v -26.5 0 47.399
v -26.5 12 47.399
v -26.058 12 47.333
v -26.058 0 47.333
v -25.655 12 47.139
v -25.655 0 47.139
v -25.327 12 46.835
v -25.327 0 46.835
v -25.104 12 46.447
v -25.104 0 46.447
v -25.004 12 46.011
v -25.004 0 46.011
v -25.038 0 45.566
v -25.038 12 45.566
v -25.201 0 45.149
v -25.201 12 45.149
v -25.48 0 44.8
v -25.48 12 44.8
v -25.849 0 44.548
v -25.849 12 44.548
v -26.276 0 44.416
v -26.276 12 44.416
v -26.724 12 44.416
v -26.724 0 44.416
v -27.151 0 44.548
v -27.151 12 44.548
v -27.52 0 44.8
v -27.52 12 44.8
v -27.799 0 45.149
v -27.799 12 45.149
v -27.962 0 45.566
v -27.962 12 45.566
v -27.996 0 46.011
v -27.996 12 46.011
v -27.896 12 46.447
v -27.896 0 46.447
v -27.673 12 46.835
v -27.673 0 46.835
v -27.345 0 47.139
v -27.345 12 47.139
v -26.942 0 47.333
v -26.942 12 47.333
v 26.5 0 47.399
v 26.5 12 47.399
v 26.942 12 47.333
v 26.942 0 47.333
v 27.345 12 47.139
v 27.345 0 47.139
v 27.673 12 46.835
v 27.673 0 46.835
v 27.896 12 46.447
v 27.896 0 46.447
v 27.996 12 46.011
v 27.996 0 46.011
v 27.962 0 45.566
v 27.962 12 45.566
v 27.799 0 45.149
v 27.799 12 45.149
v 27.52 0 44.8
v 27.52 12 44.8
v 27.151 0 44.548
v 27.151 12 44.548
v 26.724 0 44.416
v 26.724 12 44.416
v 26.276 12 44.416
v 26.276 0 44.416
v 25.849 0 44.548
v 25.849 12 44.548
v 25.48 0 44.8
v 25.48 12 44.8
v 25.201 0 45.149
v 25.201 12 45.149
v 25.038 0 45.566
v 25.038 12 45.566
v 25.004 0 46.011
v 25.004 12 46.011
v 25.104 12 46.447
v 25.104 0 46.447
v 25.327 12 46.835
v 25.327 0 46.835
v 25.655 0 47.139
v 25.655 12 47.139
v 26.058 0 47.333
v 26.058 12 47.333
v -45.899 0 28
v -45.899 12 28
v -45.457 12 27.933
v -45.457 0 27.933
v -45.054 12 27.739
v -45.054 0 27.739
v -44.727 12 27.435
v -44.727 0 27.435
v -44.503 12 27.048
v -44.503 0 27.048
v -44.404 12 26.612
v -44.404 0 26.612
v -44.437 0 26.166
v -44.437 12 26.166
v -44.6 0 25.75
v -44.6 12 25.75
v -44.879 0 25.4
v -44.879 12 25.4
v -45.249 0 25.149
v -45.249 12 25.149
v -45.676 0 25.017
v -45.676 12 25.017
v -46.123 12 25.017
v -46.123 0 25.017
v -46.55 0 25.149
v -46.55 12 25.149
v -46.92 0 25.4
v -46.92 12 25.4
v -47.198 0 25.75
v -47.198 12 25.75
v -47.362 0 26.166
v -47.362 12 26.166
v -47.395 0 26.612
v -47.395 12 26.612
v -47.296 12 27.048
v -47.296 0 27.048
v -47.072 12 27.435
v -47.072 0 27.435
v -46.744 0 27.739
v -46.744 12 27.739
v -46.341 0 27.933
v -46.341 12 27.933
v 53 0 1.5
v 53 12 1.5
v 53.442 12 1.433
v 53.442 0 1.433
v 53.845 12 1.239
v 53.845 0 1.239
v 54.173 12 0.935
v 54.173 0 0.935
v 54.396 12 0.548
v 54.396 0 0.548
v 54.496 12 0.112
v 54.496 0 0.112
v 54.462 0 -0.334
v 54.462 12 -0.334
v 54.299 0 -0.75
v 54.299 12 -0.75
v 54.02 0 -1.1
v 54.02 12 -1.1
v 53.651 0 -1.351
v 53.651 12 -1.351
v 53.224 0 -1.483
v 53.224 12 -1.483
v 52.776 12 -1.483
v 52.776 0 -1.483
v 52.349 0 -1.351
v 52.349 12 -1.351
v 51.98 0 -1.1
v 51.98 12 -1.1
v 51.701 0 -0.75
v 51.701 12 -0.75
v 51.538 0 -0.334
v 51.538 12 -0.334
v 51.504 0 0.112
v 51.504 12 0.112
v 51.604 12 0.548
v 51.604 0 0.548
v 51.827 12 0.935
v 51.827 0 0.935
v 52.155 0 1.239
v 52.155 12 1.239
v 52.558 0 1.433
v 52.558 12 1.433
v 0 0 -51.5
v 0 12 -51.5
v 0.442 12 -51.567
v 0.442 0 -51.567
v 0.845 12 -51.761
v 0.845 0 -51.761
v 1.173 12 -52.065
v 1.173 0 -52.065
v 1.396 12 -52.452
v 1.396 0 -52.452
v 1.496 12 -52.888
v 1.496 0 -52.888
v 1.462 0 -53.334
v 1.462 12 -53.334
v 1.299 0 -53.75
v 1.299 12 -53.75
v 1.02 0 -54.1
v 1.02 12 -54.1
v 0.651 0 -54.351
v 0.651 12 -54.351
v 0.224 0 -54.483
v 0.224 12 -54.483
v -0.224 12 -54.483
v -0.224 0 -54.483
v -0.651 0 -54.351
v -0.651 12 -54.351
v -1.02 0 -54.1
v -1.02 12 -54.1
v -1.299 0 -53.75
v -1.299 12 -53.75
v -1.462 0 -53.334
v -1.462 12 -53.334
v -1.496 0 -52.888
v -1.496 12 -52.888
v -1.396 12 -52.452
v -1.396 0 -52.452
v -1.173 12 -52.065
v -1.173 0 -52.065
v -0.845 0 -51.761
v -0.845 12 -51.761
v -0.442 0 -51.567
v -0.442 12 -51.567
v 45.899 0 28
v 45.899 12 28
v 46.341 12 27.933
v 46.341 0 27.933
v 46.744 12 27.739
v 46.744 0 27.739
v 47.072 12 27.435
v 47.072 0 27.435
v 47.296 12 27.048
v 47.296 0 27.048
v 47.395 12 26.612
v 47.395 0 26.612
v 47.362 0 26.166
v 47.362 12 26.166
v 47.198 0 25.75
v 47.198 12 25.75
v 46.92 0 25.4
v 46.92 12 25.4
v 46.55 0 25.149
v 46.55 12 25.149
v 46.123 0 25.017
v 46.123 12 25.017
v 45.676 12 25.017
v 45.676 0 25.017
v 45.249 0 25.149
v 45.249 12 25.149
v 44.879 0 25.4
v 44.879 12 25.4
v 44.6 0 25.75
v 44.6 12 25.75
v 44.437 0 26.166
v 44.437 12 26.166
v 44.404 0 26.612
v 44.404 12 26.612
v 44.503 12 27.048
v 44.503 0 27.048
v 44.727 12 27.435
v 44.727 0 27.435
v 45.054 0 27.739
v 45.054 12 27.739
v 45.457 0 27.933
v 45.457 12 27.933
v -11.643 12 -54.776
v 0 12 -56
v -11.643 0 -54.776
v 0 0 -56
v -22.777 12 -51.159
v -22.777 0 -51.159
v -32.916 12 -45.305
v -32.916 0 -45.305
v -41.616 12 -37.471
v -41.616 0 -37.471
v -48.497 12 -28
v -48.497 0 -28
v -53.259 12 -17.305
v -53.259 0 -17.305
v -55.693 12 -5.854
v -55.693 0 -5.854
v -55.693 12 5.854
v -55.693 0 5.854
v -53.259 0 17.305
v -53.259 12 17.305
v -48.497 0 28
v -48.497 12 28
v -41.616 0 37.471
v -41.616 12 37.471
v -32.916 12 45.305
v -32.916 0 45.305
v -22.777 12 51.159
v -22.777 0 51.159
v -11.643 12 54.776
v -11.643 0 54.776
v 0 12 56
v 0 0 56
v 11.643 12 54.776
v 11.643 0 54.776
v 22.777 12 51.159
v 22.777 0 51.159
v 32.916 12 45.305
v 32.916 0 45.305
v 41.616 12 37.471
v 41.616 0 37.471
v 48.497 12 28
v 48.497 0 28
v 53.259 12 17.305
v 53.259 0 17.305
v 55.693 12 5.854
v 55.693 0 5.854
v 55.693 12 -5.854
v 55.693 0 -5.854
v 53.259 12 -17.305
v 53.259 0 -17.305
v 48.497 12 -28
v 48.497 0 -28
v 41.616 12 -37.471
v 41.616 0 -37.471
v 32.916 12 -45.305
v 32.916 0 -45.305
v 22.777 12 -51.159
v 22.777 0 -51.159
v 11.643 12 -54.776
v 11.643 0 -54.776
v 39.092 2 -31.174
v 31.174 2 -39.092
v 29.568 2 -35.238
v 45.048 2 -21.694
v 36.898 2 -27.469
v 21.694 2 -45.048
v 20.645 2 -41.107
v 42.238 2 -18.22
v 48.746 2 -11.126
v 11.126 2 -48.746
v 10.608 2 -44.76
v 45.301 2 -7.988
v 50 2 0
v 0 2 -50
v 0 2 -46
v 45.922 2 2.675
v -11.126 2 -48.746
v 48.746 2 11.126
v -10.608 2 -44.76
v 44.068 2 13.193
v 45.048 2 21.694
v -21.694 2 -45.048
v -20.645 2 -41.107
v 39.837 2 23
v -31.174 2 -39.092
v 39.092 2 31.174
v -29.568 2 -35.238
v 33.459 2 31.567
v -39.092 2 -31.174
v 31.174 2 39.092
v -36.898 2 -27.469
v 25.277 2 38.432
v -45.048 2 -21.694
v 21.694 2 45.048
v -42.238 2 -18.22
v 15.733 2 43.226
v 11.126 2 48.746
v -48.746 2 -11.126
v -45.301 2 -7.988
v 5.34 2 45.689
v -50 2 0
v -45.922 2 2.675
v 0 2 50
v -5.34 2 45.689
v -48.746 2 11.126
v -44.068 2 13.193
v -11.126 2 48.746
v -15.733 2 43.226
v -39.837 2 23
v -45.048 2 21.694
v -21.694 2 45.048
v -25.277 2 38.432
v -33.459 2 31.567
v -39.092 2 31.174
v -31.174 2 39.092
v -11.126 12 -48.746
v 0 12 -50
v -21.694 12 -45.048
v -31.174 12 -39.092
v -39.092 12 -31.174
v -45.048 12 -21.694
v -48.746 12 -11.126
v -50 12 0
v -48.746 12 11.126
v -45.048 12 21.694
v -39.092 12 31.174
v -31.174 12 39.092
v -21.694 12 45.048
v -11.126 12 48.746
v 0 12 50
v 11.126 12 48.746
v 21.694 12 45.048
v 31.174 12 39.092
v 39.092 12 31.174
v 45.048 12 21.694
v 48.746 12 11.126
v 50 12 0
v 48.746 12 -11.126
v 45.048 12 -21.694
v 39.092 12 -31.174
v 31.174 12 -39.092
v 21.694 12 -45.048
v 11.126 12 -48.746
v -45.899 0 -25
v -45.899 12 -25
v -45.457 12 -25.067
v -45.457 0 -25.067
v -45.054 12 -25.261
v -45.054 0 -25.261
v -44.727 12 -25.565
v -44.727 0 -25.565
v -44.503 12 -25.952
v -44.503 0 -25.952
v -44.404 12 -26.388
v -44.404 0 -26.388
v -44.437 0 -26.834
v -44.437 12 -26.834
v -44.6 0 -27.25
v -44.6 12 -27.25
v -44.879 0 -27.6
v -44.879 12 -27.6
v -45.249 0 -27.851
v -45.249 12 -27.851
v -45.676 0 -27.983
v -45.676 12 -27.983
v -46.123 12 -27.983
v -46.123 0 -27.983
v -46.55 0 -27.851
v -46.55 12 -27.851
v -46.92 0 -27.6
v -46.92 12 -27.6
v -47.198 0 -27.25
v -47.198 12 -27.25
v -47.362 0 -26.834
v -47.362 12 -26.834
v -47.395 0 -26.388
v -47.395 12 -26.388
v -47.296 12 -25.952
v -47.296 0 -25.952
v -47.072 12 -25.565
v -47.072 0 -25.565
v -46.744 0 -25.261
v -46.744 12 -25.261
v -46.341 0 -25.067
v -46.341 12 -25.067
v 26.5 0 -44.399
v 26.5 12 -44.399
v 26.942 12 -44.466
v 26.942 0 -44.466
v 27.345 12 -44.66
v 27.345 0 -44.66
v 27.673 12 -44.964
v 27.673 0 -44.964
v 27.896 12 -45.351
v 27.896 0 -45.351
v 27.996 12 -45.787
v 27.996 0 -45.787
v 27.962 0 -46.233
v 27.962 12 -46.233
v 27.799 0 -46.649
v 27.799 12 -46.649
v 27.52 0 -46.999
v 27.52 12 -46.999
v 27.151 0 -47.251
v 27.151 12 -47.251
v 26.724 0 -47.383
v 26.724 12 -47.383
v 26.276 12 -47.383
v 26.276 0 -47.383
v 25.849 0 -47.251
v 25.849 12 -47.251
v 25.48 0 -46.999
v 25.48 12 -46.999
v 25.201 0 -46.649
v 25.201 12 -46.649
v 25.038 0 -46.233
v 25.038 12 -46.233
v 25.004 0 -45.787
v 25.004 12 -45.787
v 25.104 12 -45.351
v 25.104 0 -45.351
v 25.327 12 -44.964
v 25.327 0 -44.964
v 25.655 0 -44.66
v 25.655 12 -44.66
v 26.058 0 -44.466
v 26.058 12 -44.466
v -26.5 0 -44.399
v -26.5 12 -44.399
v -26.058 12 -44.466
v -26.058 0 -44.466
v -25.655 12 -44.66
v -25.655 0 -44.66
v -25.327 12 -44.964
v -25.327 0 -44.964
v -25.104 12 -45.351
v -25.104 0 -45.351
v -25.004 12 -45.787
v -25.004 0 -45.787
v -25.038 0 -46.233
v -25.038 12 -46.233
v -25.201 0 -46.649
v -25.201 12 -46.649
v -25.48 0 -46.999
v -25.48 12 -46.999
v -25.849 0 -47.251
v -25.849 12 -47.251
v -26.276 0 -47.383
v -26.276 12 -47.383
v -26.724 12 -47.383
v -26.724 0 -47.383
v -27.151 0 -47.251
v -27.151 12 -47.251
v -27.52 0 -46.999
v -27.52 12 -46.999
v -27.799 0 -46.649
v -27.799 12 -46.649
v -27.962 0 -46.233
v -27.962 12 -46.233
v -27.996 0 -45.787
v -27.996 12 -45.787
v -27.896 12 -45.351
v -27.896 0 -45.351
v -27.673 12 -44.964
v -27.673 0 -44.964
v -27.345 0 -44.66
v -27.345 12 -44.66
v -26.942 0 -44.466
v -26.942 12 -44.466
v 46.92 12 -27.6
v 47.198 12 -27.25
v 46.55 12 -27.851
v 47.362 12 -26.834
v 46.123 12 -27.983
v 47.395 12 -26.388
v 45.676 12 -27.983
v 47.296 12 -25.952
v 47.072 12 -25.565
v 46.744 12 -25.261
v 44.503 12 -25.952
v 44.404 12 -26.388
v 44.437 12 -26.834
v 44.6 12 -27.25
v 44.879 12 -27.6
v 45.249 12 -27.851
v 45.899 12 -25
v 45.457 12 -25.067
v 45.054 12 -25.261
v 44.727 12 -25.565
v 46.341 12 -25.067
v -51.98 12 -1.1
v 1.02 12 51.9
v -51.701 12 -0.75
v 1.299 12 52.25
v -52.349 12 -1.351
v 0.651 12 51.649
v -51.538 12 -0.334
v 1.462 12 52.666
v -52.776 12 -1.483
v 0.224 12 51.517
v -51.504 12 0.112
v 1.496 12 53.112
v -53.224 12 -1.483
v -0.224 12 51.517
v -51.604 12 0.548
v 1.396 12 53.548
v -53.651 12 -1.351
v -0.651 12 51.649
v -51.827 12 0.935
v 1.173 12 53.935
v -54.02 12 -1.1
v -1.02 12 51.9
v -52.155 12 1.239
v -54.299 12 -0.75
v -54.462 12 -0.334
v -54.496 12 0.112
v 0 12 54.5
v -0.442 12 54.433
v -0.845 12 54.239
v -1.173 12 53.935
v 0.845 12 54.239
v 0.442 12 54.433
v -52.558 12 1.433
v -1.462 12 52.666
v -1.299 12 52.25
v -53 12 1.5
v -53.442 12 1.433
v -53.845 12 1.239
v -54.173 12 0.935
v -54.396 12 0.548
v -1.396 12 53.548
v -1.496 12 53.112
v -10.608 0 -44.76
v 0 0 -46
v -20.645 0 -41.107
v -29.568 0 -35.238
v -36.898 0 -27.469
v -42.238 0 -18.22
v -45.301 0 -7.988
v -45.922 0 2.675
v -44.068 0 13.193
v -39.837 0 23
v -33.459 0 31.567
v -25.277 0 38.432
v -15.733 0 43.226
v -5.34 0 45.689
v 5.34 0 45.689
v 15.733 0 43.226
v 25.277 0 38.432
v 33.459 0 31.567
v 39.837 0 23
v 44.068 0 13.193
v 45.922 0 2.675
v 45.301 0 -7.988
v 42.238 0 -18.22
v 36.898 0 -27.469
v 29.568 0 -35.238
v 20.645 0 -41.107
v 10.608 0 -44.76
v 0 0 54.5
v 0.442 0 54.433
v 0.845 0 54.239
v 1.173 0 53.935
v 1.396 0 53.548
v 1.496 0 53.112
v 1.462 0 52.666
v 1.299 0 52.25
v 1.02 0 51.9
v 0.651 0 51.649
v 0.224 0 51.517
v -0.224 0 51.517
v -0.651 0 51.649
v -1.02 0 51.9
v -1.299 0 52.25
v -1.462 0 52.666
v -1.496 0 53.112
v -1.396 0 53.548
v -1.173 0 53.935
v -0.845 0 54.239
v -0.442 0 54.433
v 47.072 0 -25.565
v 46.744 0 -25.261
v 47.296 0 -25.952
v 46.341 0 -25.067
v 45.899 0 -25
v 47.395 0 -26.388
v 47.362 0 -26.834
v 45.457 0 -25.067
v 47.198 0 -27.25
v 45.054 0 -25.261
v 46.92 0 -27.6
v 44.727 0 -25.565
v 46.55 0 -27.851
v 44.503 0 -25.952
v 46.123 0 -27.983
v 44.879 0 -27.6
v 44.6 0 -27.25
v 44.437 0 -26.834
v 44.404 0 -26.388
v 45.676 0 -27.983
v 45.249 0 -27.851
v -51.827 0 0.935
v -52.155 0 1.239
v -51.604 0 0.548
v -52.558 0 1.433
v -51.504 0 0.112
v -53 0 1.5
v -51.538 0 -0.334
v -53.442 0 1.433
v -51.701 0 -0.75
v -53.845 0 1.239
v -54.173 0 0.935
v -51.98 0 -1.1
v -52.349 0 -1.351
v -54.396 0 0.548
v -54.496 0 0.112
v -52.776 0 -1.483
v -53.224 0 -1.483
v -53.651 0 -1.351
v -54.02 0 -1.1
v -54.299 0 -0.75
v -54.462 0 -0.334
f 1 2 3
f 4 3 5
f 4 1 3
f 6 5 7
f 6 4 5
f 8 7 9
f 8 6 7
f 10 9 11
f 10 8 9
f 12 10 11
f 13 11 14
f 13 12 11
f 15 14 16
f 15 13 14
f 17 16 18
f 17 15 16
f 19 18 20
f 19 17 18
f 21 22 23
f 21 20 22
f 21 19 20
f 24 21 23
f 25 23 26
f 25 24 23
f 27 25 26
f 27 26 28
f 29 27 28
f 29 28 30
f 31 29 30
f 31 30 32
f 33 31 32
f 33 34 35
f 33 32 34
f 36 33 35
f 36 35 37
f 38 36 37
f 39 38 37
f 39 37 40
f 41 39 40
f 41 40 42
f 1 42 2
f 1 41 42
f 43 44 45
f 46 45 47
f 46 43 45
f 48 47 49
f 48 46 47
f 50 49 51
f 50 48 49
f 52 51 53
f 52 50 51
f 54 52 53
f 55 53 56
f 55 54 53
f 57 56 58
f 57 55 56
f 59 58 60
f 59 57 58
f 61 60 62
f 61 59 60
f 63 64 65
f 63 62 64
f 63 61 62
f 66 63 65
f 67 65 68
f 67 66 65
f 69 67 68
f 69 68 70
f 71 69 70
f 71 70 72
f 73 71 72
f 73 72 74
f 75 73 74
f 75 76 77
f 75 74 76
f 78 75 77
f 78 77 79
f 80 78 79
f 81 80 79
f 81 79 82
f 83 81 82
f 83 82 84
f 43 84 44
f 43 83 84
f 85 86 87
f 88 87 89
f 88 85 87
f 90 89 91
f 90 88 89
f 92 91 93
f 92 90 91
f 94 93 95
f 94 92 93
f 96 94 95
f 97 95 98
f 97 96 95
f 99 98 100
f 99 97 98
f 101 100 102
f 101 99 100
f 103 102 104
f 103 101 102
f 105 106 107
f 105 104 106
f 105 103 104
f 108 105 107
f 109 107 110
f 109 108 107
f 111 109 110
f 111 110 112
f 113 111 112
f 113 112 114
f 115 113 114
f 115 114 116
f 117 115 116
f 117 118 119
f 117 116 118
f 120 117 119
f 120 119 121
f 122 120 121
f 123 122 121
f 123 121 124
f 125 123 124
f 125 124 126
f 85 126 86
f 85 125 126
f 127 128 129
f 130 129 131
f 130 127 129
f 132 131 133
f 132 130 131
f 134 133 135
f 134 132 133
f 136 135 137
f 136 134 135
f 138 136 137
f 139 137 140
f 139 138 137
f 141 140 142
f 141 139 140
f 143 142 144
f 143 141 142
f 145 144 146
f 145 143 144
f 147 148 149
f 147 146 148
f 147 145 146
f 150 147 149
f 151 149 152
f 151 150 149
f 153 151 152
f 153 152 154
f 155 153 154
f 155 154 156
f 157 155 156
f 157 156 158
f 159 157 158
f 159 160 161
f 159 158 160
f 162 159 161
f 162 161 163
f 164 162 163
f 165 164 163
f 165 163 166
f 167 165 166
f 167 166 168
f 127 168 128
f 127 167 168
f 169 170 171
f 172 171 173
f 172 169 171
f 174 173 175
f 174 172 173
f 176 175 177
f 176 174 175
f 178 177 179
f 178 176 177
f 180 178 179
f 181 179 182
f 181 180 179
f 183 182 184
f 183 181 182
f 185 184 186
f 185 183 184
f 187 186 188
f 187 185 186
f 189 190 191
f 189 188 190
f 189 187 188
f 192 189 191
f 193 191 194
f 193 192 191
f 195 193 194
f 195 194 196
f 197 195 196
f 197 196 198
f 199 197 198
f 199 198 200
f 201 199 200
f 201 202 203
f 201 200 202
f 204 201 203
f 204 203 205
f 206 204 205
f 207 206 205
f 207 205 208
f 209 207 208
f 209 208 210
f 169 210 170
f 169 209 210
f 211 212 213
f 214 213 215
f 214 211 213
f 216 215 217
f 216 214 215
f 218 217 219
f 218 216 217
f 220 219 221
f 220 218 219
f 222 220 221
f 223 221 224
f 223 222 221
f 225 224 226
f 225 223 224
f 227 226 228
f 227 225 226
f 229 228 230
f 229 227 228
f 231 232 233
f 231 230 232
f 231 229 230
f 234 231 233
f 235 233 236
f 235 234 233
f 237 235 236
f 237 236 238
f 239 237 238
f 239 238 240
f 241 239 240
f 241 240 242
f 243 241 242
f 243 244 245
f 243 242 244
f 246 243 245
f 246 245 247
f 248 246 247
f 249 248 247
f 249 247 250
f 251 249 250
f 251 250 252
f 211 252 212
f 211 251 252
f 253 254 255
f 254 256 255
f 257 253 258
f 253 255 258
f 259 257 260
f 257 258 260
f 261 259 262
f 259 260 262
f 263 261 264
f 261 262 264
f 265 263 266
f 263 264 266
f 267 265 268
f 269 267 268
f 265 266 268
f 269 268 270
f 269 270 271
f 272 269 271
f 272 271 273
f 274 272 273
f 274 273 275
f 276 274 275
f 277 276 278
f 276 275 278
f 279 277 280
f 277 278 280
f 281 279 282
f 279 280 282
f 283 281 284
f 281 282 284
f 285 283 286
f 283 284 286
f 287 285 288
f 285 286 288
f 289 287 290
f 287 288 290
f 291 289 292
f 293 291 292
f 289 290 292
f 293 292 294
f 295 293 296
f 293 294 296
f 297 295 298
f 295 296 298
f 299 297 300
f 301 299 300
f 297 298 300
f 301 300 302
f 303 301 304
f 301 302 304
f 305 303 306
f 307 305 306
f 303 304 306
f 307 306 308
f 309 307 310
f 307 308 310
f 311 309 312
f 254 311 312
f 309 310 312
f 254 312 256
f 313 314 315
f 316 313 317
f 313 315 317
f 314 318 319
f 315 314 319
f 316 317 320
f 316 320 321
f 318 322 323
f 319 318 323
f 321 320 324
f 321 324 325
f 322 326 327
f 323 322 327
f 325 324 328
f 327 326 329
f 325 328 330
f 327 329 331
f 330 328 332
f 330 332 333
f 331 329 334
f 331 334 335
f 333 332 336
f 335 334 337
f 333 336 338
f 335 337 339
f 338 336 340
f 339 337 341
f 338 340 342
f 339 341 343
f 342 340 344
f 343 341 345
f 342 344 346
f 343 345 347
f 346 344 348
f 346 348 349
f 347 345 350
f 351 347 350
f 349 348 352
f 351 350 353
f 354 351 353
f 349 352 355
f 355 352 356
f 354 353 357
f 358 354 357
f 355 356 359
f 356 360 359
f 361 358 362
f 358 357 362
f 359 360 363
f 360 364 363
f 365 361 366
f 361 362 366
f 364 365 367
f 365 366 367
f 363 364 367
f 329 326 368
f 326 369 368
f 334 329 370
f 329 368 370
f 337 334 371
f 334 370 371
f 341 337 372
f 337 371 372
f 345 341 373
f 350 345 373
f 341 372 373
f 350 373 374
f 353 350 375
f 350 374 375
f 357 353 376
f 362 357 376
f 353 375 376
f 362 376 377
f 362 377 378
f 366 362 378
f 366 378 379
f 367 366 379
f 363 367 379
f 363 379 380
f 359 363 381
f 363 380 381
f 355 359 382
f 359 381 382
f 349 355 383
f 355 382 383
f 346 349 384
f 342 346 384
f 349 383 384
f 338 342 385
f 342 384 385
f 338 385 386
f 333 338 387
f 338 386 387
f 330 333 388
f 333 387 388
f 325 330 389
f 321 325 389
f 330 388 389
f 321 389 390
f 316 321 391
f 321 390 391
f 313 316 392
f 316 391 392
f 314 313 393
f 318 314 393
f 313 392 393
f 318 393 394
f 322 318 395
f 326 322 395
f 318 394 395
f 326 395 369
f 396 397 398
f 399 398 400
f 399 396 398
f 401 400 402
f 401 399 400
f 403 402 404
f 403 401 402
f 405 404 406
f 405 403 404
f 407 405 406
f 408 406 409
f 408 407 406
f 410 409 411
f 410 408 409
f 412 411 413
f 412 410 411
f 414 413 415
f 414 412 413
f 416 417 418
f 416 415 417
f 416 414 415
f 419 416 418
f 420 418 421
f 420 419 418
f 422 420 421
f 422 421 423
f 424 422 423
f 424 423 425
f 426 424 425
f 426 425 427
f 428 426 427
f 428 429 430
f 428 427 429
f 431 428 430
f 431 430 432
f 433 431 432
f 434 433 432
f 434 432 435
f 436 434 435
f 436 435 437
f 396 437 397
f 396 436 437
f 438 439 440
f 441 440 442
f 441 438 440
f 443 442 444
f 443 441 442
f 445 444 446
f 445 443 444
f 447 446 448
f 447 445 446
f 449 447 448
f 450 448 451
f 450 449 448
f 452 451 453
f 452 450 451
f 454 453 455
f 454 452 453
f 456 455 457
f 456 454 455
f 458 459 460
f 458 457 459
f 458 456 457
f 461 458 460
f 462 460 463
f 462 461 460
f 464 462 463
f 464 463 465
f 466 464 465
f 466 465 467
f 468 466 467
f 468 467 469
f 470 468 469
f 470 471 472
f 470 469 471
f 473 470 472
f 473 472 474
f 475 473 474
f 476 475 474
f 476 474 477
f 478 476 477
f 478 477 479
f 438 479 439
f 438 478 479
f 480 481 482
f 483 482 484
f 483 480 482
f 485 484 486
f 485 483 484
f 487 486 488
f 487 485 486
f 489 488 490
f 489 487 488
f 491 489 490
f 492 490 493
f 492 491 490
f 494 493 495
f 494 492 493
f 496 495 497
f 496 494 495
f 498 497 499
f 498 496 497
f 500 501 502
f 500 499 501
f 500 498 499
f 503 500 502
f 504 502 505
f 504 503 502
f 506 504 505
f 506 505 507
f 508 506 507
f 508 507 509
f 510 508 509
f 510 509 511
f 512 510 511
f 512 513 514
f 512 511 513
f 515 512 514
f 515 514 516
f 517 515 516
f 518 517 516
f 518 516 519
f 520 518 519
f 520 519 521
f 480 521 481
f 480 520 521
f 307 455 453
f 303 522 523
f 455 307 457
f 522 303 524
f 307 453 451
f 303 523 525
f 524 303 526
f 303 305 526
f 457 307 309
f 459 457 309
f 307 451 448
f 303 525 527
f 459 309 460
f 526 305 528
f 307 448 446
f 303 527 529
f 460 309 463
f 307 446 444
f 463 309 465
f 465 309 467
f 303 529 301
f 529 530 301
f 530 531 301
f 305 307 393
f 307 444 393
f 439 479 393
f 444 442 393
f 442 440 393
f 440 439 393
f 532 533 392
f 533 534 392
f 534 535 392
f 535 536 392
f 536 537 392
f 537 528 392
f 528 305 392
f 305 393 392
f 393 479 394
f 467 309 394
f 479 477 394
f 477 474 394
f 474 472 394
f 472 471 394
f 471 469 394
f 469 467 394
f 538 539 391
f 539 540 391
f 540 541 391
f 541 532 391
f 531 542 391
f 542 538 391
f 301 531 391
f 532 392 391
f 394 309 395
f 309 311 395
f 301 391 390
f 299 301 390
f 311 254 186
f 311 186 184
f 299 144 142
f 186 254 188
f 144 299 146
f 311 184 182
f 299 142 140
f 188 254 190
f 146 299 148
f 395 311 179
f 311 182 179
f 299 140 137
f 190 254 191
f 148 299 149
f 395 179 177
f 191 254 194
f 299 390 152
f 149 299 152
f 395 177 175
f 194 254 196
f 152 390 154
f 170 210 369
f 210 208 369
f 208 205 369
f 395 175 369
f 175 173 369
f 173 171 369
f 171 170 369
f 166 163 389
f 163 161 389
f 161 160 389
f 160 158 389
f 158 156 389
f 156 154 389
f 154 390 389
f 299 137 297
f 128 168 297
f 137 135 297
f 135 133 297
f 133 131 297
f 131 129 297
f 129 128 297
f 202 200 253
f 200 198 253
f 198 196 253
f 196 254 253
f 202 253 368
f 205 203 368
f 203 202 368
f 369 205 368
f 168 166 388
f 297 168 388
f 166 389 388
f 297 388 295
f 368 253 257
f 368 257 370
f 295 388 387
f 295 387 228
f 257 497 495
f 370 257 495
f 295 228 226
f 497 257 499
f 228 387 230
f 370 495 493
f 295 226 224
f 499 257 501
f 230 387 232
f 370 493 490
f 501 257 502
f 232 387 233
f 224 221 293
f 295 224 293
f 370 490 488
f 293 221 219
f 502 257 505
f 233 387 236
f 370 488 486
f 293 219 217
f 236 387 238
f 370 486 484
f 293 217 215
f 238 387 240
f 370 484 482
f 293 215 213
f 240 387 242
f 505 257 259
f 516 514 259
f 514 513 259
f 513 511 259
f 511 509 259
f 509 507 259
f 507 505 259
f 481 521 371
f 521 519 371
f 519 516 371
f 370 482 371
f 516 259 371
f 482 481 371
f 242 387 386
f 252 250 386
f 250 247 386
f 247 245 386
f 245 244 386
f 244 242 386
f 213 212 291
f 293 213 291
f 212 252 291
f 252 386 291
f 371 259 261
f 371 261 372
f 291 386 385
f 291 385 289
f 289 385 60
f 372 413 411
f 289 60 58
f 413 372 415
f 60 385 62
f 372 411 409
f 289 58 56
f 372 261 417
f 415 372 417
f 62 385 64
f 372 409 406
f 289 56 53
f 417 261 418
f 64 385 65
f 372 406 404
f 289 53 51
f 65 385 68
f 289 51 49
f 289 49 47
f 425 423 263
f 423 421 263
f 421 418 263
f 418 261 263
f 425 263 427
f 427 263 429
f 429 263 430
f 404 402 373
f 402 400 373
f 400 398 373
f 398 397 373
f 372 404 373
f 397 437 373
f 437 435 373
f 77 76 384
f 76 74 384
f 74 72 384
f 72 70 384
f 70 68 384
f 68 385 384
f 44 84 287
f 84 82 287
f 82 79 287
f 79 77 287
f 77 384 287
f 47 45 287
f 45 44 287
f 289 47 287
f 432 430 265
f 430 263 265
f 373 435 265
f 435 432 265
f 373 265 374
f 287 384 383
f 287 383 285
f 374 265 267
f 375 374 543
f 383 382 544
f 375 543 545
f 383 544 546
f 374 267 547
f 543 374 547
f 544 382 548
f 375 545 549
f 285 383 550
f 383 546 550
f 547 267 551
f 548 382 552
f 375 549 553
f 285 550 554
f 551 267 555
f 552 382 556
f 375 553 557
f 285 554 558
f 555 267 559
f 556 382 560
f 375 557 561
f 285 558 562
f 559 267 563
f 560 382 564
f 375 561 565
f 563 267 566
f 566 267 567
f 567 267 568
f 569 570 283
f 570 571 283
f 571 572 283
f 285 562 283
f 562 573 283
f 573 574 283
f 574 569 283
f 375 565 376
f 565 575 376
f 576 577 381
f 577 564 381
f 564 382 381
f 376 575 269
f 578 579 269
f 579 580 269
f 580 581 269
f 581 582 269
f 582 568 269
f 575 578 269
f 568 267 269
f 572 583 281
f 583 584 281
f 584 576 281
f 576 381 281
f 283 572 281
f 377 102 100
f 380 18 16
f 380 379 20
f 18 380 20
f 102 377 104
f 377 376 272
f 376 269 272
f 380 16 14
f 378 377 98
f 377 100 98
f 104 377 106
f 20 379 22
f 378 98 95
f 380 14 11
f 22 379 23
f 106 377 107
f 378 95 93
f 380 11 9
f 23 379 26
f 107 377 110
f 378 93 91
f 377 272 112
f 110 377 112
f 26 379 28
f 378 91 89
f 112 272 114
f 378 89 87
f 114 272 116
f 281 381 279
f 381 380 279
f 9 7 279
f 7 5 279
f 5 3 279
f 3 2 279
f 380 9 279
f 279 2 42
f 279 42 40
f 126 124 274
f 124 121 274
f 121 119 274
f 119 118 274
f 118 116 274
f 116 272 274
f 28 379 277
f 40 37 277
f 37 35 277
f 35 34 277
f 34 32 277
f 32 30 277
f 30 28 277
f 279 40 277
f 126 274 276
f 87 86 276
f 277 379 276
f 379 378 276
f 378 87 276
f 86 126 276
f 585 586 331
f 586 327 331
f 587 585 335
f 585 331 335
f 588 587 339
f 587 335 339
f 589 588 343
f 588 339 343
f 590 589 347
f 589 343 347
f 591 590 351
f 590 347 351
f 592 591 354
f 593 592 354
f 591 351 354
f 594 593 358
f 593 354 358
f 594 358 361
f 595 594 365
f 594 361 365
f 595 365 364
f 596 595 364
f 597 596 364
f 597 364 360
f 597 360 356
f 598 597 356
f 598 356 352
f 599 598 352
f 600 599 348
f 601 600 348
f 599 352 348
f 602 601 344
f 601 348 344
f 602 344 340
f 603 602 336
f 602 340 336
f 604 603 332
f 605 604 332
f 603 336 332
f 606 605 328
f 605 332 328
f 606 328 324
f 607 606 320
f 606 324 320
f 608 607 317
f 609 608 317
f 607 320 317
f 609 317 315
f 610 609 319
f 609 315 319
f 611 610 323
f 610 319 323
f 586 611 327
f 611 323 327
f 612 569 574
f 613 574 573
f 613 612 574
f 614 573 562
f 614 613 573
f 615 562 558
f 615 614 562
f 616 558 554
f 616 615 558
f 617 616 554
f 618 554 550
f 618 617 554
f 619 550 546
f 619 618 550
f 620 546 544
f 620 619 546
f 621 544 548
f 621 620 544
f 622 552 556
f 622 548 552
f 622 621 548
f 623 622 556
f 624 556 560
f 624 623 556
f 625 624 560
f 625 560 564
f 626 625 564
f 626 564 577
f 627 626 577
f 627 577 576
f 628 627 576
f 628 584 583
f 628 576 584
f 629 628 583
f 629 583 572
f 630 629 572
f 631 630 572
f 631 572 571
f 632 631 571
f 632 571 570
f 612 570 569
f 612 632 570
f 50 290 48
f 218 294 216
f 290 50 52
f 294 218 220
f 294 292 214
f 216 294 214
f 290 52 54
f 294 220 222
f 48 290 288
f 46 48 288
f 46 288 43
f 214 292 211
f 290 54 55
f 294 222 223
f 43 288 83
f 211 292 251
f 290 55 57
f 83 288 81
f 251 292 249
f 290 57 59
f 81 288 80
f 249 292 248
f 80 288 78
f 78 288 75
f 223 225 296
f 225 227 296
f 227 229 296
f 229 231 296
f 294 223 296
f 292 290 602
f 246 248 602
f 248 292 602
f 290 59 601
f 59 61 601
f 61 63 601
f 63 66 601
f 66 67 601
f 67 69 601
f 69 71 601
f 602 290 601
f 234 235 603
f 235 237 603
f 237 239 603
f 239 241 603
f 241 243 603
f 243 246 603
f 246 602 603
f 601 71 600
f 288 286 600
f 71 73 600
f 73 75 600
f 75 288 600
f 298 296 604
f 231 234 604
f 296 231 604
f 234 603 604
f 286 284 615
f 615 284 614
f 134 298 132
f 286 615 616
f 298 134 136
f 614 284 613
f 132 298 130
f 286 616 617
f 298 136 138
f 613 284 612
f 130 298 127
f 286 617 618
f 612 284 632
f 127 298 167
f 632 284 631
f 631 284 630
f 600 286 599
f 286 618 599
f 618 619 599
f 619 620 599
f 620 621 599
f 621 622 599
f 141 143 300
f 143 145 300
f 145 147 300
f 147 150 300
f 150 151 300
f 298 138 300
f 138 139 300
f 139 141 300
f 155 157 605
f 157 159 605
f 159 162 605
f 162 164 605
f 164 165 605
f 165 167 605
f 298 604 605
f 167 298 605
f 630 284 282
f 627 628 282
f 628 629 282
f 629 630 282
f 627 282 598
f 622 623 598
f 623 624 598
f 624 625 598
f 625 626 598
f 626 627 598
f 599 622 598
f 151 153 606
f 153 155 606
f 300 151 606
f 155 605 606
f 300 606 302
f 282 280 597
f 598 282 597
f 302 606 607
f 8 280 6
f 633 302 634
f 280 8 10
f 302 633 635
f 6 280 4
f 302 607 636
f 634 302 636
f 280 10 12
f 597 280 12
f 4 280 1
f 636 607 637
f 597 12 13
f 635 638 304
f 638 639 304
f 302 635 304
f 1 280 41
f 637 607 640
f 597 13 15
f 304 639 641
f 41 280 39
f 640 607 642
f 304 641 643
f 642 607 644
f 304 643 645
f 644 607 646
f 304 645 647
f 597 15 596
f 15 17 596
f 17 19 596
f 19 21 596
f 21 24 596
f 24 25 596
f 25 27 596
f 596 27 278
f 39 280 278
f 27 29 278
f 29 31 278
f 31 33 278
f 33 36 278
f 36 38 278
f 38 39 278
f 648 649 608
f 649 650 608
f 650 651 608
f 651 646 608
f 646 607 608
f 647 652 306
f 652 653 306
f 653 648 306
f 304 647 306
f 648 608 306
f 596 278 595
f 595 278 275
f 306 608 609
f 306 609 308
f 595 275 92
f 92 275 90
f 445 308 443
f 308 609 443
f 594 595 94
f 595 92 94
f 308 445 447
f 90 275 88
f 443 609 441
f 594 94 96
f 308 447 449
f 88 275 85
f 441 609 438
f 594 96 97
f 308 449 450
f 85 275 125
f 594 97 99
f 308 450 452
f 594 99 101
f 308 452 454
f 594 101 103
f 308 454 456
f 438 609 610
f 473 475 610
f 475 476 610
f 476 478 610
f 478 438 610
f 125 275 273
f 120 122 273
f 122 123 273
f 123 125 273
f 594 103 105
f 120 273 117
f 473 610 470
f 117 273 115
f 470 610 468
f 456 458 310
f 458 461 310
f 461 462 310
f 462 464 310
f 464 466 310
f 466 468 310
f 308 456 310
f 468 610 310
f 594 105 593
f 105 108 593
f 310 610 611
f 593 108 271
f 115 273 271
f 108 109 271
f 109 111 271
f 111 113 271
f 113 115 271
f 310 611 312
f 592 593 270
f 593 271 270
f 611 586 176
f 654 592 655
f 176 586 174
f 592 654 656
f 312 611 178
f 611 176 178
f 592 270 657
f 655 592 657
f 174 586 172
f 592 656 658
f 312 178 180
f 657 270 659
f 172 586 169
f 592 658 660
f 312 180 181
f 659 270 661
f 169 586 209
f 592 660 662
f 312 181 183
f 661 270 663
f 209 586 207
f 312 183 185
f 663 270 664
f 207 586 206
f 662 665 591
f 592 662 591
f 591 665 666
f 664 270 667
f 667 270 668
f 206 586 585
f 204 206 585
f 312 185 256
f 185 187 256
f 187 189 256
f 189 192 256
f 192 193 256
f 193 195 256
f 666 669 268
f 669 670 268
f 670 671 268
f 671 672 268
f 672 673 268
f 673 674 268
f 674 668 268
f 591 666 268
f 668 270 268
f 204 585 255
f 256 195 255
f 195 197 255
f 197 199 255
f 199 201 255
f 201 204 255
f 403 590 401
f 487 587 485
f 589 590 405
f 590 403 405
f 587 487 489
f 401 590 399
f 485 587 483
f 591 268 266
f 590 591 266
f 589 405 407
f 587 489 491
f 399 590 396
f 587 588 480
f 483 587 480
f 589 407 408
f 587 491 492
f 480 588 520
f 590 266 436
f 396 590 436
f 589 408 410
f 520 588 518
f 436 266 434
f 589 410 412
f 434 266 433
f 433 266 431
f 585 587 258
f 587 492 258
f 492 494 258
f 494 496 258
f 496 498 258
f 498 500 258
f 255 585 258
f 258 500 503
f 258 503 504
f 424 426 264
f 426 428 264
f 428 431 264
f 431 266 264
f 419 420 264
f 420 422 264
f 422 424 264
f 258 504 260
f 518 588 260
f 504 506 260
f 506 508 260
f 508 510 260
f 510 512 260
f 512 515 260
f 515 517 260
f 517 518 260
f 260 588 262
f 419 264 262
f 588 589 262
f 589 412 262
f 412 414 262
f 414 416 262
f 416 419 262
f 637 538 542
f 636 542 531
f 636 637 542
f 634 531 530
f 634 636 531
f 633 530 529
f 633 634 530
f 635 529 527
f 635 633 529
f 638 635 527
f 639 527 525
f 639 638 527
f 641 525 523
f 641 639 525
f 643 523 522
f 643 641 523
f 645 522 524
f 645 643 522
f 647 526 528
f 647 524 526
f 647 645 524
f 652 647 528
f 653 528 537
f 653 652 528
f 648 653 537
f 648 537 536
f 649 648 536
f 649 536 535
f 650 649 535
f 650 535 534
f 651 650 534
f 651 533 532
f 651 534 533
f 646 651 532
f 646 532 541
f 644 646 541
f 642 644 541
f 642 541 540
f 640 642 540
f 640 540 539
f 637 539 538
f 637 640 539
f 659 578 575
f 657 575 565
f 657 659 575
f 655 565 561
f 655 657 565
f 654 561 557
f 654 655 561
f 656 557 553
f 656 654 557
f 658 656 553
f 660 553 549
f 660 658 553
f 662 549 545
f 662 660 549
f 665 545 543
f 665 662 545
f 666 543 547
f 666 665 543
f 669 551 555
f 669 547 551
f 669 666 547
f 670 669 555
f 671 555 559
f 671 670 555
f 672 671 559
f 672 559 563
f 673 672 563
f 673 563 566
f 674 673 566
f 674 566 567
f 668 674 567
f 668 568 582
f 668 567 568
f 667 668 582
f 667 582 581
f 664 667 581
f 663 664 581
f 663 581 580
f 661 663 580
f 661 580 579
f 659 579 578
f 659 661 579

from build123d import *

# Parameters (mm, degrees)
SKETCH_3_R          = 1.5
CUT_EXTRUDE_3_DEPTH = 81.099937578


with BuildPart() as part:
    # 草图2 → 旋转1 (revolve)
    with BuildSketch(Plane.XY, mode=Mode.PRIVATE) as revolve_1_sk:
        Polygon((46, 0), (46, 2), (50, 2), (50, 12), (56, 12), (56, 0), align=None)
    revolve(revolve_1_sk.sketch.rotate(Axis((0, 0, 0), (0, 1, 0)), 90), axis=Axis((0, 0, 0), (0, 1, 0)))

    # 草图3 → 切除-拉伸3 (cut, through all)
    with BuildSketch(Plane(origin=(0, 0, 0), x_dir=(1, 0, 0), z_dir=(0, 1, 0))):
        with Locations(Location((0, 53, 0), (0, 0, 270))):
            Circle(SKETCH_3_R)
        with Locations(Location((26.5, 45.899346401, 0), (0, 0, 270))):
            Circle(SKETCH_3_R)
        with Locations(Location((45.899346401, 26.5, 0), (0, 0, 270))):
            Circle(SKETCH_3_R)
        with Locations(Location((53, 0, 0), (0, 0, 270))):
            Circle(SKETCH_3_R)
        with Locations(Location((45.899346401, -26.5, 0), (0, 0, 270))):
            Circle(SKETCH_3_R)
        with Locations(Location((26.5, -45.899346401, 0), (0, 0, 270))):
            Circle(SKETCH_3_R)
        with Locations(Location((0, -53, 0), (0, 0, 270))):
            Circle(SKETCH_3_R)
        with Locations(Location((-26.5, -45.899346401, 0), (0, 0, 270))):
            Circle(SKETCH_3_R)
        with Locations(Location((-45.899346401, -26.5, 0), (0, 0, 270))):
            Circle(SKETCH_3_R)
        with Locations(Location((-53, 0, 0), (0, 0, 270))):
            Circle(SKETCH_3_R)
        with Locations(Location((-45.899346401, 26.5, 0), (0, 0, 270))):
            Circle(SKETCH_3_R)
        with Locations(Location((-26.5, 45.899346401, 0), (0, 0, 270))):
            Circle(SKETCH_3_R)
    extrude(amount=CUT_EXTRUDE_3_DEPTH, mode=Mode.SUBTRACT)


solid = part.part
